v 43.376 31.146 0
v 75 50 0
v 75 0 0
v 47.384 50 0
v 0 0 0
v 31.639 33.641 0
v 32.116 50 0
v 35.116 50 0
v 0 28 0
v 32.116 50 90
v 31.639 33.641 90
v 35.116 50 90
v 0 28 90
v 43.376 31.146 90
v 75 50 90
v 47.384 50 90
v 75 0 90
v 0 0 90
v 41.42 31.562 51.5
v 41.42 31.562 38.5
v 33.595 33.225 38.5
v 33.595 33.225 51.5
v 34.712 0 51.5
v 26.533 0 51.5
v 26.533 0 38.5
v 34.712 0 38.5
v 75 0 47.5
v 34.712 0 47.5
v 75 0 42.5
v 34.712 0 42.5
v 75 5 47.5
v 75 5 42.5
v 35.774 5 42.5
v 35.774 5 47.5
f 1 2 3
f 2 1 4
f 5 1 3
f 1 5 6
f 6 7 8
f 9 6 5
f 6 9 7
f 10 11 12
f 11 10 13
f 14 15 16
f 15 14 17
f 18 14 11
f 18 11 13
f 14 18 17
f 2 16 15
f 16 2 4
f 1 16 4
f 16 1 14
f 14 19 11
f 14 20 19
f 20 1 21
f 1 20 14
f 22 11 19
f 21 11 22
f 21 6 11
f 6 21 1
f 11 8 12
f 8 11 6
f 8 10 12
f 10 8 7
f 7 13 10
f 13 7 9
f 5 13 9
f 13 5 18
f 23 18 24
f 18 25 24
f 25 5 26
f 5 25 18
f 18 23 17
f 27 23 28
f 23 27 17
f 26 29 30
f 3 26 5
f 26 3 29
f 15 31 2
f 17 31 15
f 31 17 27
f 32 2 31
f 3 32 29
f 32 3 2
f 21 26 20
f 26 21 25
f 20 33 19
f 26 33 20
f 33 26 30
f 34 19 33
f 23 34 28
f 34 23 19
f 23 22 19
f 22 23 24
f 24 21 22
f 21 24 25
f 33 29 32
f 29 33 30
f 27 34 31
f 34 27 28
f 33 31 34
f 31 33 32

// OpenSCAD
// ── DOCK VERTICAL PARA CARREGAR O TELEMÓVEL — PERSONALIZADO (texto/imagem à face, 3MF) ──
//
// Bloco para a mesa com uma ranhura em cima onde o telemóvel fica de pé (ligeiramente inclinado
// para trás) e um furo no fundo da ranhura para a ficha do cabo (USB-C/Lightning): a ficha entra
// por baixo e o cabo sai por um canal no fundo, para trás. O perfil (vista de lado) está em XY —
// x para trás a partir da frente, y para cima — e é extrudido pela largura em z: sai deitado de
// lado, que é como se imprime (sem suportes). A ranhura é aberta dos dois lados (cabe qualquer
// largura de telemóvel); o furo da ficha e o canal do cabo ficam a meio da largura.
//
// Texto ou imagem embutidos À FACE, noutra cor, na frente (zona "frente") e/ou na face inclinada
// de cima, à frente do telemóvel (zona "inclinada"). Sai em 3MF (generation_schema.multicor):
//   "corpo"  dock com os rebaixos      "frente" / "inclinada"  enchimento de cada zona
//   "frente_solta" / "inclinada_solta"  sem AMS: o enchimento deitado na mesa, com folga, para colar
// (sem modo: tudo, com cores — só para ver no OpenSCAD).
// Do servidor: esc_texto_frente / esc_texto_inclinada (lib/textFit.js) e frente_pts / frente_paths
//   / tem_frente, inclinada_pts / inclinada_paths / tem_inclinada (lib/logo.js).
// Se mudares as fórmulas, muda também Maker_Pro_Frontend_Prod/lib/suportesTelemovelExtra.ts.

function _W()  = is_undef(largura) ? 90 : largura;
function _D()  = is_undef(profundidade) ? 75 : profundidade;
function _H()  = is_undef(altura) ? 50 : altura;
function _Hf() = max(8, min(_H() - 5, is_undef(altura_frente) ? 28 : altura_frente));
function _a()  = is_undef(angulo) ? 12 : angulo;
function _g()  = is_undef(espessura_telemovel) ? 12 : espessura_telemovel;
function _ds() = min(_H() - 12, is_undef(profundidade_ranhura) ? 18 : profundidade_ranhura);
function _wf() = is_undef(largura_ficha) ? 13 : largura_ficha;
function _tf() = is_undef(espessura_ficha) ? 8 : espessura_ficha;
function _wc() = min(_wf(), is_undef(diametro_cabo) ? 5 : diametro_cabo);

function _Vp() = [sin(_a()), cos(_a())];                             // eixo do telemóvel, para cima
function _Np() = [cos(_a()), -sin(_a())];                            // normal (para trás)
function _gc() = _g() / (2 * cos(_a()));                             // meia largura da ranhura na horizontal
// ranhura: a meio da profundidade, mas com pelo menos 10 mm de parede atrás e 14 à frente
function _xs() = max(_gc() + 14, min(0.55 * _D(), _D() - _gc() - 10 - _ds() * sin(_a())));
function _B()  = [_xs(), _H()] - _ds() * _Vp();                      // fundo da ranhura (eixo)
function _xf() = _xs() - _gc() - 3;                                  // fim da face inclinada
function _Px() = _B()[0] - _B()[1] * tan(_a());                      // onde o furo da ficha sai em baixo

module bloco() { polygon([[0, 0], [_D(), 0], [_D(), _H()], [_xf(), _H()], [0, _Hf()]]); }
module ranhura() {
    B = _B(); g2 = _g() / 2; Np = _Np(); Vp = _Vp(); L = _ds() + 30;
    polygon([B - g2 * Np, B + g2 * Np, B + g2 * Np + L * Vp, B - g2 * Np + L * Vp]);
}
module furo_ficha() {
    B = _B(); t2 = _tf() / 2; Np = _Np(); Vp = _Vp(); L = (B[1] + 2) / cos(_a());
    polygon([B - t2 * Np + Vp, B + t2 * Np + Vp, B + t2 * Np - L * Vp, B - t2 * Np - L * Vp]);
}
module canal_cabo() { translate([_Px() - _wc() / 2, -1]) square([_D() - _Px() + _wc() / 2 + 1, _wc() + 1]); }

module dock() {
    W = _W();
    difference() {
        linear_extrude(height = W) difference() { bloco(); ranhura(); }
        translate([0, 0, (W - _wf()) / 2]) linear_extrude(height = _wf()) furo_ficha();
        translate([0, 0, (W - _wc()) / 2]) linear_extrude(height = _wc()) canal_cabo();
    }
}

// ══ personalização: texto/imagem à face ══
MARG = 4;                                                            // margem às arestas da largura (mm)
MV = 1;                                                              // margem às arestas em altura (mm)
function _modo()  = is_undef(modo) ? "tudo" : modo;
function _fonte() = is_undef(fonte) ? "Open Sans" : fonte;
function _dp()    = max(0.4, min(is_undef(profundidade_embutido) ? 1 : profundidade_embutido, 3));
function _conteudo(z) = z == "frente" ? (is_undef(conteudo_frente) ? "Texto" : conteudo_frente)
                                      : (is_undef(conteudo_inclinada) ? "Nada" : conteudo_inclinada);
function _texto(z) = z == "frente" ? (is_undef(texto_frente) ? "pp3d" : texto_frente) : (is_undef(texto_inclinada) ? "" : texto_inclinada);
function _tam(z)   = z == "frente" ? (is_undef(tamanho_texto_frente) ? 14 : tamanho_texto_frente) : (is_undef(tamanho_texto_inclinada) ? 10 : tamanho_texto_inclinada);
function _esc(z)   = let(v = z == "frente" ? (is_undef(esc_texto_frente) ? 1 : esc_texto_frente) : (is_undef(esc_texto_inclinada) ? 1 : esc_texto_inclinada)) max(0.05, min(1, v));
function _tem_img(z) = z == "frente" ? (!is_undef(tem_frente) && tem_frente == true && !is_undef(frente_pts) && len(frente_pts) >= 3)
                                     : (!is_undef(tem_inclinada) && tem_inclinada == true && !is_undef(inclinada_pts) && len(inclinada_pts) >= 3);
function _ativa(z) = _conteudo(z) == "Texto" ? len(_texto(z)) > 0 : _conteudo(z) == "Imagem" ? _tem_img(z) : false;

function _Li() = norm([_xf(), _H() - _Hf()]);                        // comprimento da face inclinada
function _Vi() = [_xf(), _H() - _Hf()] / _Li();
// face → peça: (u, v, w), u = leitura, v = para cima, w para fora da face (rotação própria)
function _M(z) = let(W = _W())
    z == "frente"
    ? [[0, 0, -1, 0], [0, 1, 0, _Hf() / 2], [1, 0, 0, W / 2], [0, 0, 0, 1]]
    : let(v = _Vi()) [[0, v[0], -v[1], _xf() / 2], [0, v[1], v[0], (_Hf() + _H()) / 2], [1, 0, 0, W / 2], [0, 0, 0, 1]];

module zona(z) {
    W = _W(); h = z == "frente" ? _Hf() : _Li();
    translate([-(W / 2 - MARG), -(h / 2 - MV)]) square([W - 2 * MARG, h - 2 * MV]);
}

module conteudo2d(z) {
    intersection() {
        zona(z);
        if (_conteudo(z) == "Texto")
            scale(_esc(z)) offset(delta = 0.01)
                text(_texto(z), size = _tam(z), font = _fonte(), halign = "center", valign = "center", $fn = 16);
        else if (_conteudo(z) == "Imagem" && _tem_img(z)) {
            if (z == "frente") polygon(points = frente_pts, paths = frente_paths);
            else polygon(points = inclinada_pts, paths = inclinada_paths);
        }
    }
}
module na_face(z, w0, w1) { multmatrix(_M(z)) translate([0, 0, w0]) linear_extrude(height = w1 - w0) conteudo2d(z); }
module enchimento(z) { if (_ativa(z)) na_face(z, -_dp(), 0); }

function _fe() = max(0, min(0.5, is_undef(folga_embutido) ? 0.15 : folga_embutido));
module solta(z) { if (_ativa(z)) linear_extrude(height = _dp()) offset(delta = -_fe()) conteudo2d(z); }

module corpo() {
    difference() {
        dock();
        for (z = ["frente", "inclinada"]) if (_ativa(z)) na_face(z, -_dp(), 0.5);
    }
}

if (_modo() == "corpo") corpo();
else if (_modo() == "frente") enchimento("frente");
else if (_modo() == "inclinada") enchimento("inclinada");
else if (_modo() == "frente_solta") solta("frente");
else if (_modo() == "inclinada_solta") solta("inclinada");
else {
    color(is_undef(cor_suporte) ? "#111111" : cor_suporte) corpo();
    color(is_undef(cor_frente) ? "#FFFFFF" : cor_frente) enchimento("frente");
    color(is_undef(cor_inclinada) ? "#FFFFFF" : cor_inclinada) enchimento("inclinada");
}
